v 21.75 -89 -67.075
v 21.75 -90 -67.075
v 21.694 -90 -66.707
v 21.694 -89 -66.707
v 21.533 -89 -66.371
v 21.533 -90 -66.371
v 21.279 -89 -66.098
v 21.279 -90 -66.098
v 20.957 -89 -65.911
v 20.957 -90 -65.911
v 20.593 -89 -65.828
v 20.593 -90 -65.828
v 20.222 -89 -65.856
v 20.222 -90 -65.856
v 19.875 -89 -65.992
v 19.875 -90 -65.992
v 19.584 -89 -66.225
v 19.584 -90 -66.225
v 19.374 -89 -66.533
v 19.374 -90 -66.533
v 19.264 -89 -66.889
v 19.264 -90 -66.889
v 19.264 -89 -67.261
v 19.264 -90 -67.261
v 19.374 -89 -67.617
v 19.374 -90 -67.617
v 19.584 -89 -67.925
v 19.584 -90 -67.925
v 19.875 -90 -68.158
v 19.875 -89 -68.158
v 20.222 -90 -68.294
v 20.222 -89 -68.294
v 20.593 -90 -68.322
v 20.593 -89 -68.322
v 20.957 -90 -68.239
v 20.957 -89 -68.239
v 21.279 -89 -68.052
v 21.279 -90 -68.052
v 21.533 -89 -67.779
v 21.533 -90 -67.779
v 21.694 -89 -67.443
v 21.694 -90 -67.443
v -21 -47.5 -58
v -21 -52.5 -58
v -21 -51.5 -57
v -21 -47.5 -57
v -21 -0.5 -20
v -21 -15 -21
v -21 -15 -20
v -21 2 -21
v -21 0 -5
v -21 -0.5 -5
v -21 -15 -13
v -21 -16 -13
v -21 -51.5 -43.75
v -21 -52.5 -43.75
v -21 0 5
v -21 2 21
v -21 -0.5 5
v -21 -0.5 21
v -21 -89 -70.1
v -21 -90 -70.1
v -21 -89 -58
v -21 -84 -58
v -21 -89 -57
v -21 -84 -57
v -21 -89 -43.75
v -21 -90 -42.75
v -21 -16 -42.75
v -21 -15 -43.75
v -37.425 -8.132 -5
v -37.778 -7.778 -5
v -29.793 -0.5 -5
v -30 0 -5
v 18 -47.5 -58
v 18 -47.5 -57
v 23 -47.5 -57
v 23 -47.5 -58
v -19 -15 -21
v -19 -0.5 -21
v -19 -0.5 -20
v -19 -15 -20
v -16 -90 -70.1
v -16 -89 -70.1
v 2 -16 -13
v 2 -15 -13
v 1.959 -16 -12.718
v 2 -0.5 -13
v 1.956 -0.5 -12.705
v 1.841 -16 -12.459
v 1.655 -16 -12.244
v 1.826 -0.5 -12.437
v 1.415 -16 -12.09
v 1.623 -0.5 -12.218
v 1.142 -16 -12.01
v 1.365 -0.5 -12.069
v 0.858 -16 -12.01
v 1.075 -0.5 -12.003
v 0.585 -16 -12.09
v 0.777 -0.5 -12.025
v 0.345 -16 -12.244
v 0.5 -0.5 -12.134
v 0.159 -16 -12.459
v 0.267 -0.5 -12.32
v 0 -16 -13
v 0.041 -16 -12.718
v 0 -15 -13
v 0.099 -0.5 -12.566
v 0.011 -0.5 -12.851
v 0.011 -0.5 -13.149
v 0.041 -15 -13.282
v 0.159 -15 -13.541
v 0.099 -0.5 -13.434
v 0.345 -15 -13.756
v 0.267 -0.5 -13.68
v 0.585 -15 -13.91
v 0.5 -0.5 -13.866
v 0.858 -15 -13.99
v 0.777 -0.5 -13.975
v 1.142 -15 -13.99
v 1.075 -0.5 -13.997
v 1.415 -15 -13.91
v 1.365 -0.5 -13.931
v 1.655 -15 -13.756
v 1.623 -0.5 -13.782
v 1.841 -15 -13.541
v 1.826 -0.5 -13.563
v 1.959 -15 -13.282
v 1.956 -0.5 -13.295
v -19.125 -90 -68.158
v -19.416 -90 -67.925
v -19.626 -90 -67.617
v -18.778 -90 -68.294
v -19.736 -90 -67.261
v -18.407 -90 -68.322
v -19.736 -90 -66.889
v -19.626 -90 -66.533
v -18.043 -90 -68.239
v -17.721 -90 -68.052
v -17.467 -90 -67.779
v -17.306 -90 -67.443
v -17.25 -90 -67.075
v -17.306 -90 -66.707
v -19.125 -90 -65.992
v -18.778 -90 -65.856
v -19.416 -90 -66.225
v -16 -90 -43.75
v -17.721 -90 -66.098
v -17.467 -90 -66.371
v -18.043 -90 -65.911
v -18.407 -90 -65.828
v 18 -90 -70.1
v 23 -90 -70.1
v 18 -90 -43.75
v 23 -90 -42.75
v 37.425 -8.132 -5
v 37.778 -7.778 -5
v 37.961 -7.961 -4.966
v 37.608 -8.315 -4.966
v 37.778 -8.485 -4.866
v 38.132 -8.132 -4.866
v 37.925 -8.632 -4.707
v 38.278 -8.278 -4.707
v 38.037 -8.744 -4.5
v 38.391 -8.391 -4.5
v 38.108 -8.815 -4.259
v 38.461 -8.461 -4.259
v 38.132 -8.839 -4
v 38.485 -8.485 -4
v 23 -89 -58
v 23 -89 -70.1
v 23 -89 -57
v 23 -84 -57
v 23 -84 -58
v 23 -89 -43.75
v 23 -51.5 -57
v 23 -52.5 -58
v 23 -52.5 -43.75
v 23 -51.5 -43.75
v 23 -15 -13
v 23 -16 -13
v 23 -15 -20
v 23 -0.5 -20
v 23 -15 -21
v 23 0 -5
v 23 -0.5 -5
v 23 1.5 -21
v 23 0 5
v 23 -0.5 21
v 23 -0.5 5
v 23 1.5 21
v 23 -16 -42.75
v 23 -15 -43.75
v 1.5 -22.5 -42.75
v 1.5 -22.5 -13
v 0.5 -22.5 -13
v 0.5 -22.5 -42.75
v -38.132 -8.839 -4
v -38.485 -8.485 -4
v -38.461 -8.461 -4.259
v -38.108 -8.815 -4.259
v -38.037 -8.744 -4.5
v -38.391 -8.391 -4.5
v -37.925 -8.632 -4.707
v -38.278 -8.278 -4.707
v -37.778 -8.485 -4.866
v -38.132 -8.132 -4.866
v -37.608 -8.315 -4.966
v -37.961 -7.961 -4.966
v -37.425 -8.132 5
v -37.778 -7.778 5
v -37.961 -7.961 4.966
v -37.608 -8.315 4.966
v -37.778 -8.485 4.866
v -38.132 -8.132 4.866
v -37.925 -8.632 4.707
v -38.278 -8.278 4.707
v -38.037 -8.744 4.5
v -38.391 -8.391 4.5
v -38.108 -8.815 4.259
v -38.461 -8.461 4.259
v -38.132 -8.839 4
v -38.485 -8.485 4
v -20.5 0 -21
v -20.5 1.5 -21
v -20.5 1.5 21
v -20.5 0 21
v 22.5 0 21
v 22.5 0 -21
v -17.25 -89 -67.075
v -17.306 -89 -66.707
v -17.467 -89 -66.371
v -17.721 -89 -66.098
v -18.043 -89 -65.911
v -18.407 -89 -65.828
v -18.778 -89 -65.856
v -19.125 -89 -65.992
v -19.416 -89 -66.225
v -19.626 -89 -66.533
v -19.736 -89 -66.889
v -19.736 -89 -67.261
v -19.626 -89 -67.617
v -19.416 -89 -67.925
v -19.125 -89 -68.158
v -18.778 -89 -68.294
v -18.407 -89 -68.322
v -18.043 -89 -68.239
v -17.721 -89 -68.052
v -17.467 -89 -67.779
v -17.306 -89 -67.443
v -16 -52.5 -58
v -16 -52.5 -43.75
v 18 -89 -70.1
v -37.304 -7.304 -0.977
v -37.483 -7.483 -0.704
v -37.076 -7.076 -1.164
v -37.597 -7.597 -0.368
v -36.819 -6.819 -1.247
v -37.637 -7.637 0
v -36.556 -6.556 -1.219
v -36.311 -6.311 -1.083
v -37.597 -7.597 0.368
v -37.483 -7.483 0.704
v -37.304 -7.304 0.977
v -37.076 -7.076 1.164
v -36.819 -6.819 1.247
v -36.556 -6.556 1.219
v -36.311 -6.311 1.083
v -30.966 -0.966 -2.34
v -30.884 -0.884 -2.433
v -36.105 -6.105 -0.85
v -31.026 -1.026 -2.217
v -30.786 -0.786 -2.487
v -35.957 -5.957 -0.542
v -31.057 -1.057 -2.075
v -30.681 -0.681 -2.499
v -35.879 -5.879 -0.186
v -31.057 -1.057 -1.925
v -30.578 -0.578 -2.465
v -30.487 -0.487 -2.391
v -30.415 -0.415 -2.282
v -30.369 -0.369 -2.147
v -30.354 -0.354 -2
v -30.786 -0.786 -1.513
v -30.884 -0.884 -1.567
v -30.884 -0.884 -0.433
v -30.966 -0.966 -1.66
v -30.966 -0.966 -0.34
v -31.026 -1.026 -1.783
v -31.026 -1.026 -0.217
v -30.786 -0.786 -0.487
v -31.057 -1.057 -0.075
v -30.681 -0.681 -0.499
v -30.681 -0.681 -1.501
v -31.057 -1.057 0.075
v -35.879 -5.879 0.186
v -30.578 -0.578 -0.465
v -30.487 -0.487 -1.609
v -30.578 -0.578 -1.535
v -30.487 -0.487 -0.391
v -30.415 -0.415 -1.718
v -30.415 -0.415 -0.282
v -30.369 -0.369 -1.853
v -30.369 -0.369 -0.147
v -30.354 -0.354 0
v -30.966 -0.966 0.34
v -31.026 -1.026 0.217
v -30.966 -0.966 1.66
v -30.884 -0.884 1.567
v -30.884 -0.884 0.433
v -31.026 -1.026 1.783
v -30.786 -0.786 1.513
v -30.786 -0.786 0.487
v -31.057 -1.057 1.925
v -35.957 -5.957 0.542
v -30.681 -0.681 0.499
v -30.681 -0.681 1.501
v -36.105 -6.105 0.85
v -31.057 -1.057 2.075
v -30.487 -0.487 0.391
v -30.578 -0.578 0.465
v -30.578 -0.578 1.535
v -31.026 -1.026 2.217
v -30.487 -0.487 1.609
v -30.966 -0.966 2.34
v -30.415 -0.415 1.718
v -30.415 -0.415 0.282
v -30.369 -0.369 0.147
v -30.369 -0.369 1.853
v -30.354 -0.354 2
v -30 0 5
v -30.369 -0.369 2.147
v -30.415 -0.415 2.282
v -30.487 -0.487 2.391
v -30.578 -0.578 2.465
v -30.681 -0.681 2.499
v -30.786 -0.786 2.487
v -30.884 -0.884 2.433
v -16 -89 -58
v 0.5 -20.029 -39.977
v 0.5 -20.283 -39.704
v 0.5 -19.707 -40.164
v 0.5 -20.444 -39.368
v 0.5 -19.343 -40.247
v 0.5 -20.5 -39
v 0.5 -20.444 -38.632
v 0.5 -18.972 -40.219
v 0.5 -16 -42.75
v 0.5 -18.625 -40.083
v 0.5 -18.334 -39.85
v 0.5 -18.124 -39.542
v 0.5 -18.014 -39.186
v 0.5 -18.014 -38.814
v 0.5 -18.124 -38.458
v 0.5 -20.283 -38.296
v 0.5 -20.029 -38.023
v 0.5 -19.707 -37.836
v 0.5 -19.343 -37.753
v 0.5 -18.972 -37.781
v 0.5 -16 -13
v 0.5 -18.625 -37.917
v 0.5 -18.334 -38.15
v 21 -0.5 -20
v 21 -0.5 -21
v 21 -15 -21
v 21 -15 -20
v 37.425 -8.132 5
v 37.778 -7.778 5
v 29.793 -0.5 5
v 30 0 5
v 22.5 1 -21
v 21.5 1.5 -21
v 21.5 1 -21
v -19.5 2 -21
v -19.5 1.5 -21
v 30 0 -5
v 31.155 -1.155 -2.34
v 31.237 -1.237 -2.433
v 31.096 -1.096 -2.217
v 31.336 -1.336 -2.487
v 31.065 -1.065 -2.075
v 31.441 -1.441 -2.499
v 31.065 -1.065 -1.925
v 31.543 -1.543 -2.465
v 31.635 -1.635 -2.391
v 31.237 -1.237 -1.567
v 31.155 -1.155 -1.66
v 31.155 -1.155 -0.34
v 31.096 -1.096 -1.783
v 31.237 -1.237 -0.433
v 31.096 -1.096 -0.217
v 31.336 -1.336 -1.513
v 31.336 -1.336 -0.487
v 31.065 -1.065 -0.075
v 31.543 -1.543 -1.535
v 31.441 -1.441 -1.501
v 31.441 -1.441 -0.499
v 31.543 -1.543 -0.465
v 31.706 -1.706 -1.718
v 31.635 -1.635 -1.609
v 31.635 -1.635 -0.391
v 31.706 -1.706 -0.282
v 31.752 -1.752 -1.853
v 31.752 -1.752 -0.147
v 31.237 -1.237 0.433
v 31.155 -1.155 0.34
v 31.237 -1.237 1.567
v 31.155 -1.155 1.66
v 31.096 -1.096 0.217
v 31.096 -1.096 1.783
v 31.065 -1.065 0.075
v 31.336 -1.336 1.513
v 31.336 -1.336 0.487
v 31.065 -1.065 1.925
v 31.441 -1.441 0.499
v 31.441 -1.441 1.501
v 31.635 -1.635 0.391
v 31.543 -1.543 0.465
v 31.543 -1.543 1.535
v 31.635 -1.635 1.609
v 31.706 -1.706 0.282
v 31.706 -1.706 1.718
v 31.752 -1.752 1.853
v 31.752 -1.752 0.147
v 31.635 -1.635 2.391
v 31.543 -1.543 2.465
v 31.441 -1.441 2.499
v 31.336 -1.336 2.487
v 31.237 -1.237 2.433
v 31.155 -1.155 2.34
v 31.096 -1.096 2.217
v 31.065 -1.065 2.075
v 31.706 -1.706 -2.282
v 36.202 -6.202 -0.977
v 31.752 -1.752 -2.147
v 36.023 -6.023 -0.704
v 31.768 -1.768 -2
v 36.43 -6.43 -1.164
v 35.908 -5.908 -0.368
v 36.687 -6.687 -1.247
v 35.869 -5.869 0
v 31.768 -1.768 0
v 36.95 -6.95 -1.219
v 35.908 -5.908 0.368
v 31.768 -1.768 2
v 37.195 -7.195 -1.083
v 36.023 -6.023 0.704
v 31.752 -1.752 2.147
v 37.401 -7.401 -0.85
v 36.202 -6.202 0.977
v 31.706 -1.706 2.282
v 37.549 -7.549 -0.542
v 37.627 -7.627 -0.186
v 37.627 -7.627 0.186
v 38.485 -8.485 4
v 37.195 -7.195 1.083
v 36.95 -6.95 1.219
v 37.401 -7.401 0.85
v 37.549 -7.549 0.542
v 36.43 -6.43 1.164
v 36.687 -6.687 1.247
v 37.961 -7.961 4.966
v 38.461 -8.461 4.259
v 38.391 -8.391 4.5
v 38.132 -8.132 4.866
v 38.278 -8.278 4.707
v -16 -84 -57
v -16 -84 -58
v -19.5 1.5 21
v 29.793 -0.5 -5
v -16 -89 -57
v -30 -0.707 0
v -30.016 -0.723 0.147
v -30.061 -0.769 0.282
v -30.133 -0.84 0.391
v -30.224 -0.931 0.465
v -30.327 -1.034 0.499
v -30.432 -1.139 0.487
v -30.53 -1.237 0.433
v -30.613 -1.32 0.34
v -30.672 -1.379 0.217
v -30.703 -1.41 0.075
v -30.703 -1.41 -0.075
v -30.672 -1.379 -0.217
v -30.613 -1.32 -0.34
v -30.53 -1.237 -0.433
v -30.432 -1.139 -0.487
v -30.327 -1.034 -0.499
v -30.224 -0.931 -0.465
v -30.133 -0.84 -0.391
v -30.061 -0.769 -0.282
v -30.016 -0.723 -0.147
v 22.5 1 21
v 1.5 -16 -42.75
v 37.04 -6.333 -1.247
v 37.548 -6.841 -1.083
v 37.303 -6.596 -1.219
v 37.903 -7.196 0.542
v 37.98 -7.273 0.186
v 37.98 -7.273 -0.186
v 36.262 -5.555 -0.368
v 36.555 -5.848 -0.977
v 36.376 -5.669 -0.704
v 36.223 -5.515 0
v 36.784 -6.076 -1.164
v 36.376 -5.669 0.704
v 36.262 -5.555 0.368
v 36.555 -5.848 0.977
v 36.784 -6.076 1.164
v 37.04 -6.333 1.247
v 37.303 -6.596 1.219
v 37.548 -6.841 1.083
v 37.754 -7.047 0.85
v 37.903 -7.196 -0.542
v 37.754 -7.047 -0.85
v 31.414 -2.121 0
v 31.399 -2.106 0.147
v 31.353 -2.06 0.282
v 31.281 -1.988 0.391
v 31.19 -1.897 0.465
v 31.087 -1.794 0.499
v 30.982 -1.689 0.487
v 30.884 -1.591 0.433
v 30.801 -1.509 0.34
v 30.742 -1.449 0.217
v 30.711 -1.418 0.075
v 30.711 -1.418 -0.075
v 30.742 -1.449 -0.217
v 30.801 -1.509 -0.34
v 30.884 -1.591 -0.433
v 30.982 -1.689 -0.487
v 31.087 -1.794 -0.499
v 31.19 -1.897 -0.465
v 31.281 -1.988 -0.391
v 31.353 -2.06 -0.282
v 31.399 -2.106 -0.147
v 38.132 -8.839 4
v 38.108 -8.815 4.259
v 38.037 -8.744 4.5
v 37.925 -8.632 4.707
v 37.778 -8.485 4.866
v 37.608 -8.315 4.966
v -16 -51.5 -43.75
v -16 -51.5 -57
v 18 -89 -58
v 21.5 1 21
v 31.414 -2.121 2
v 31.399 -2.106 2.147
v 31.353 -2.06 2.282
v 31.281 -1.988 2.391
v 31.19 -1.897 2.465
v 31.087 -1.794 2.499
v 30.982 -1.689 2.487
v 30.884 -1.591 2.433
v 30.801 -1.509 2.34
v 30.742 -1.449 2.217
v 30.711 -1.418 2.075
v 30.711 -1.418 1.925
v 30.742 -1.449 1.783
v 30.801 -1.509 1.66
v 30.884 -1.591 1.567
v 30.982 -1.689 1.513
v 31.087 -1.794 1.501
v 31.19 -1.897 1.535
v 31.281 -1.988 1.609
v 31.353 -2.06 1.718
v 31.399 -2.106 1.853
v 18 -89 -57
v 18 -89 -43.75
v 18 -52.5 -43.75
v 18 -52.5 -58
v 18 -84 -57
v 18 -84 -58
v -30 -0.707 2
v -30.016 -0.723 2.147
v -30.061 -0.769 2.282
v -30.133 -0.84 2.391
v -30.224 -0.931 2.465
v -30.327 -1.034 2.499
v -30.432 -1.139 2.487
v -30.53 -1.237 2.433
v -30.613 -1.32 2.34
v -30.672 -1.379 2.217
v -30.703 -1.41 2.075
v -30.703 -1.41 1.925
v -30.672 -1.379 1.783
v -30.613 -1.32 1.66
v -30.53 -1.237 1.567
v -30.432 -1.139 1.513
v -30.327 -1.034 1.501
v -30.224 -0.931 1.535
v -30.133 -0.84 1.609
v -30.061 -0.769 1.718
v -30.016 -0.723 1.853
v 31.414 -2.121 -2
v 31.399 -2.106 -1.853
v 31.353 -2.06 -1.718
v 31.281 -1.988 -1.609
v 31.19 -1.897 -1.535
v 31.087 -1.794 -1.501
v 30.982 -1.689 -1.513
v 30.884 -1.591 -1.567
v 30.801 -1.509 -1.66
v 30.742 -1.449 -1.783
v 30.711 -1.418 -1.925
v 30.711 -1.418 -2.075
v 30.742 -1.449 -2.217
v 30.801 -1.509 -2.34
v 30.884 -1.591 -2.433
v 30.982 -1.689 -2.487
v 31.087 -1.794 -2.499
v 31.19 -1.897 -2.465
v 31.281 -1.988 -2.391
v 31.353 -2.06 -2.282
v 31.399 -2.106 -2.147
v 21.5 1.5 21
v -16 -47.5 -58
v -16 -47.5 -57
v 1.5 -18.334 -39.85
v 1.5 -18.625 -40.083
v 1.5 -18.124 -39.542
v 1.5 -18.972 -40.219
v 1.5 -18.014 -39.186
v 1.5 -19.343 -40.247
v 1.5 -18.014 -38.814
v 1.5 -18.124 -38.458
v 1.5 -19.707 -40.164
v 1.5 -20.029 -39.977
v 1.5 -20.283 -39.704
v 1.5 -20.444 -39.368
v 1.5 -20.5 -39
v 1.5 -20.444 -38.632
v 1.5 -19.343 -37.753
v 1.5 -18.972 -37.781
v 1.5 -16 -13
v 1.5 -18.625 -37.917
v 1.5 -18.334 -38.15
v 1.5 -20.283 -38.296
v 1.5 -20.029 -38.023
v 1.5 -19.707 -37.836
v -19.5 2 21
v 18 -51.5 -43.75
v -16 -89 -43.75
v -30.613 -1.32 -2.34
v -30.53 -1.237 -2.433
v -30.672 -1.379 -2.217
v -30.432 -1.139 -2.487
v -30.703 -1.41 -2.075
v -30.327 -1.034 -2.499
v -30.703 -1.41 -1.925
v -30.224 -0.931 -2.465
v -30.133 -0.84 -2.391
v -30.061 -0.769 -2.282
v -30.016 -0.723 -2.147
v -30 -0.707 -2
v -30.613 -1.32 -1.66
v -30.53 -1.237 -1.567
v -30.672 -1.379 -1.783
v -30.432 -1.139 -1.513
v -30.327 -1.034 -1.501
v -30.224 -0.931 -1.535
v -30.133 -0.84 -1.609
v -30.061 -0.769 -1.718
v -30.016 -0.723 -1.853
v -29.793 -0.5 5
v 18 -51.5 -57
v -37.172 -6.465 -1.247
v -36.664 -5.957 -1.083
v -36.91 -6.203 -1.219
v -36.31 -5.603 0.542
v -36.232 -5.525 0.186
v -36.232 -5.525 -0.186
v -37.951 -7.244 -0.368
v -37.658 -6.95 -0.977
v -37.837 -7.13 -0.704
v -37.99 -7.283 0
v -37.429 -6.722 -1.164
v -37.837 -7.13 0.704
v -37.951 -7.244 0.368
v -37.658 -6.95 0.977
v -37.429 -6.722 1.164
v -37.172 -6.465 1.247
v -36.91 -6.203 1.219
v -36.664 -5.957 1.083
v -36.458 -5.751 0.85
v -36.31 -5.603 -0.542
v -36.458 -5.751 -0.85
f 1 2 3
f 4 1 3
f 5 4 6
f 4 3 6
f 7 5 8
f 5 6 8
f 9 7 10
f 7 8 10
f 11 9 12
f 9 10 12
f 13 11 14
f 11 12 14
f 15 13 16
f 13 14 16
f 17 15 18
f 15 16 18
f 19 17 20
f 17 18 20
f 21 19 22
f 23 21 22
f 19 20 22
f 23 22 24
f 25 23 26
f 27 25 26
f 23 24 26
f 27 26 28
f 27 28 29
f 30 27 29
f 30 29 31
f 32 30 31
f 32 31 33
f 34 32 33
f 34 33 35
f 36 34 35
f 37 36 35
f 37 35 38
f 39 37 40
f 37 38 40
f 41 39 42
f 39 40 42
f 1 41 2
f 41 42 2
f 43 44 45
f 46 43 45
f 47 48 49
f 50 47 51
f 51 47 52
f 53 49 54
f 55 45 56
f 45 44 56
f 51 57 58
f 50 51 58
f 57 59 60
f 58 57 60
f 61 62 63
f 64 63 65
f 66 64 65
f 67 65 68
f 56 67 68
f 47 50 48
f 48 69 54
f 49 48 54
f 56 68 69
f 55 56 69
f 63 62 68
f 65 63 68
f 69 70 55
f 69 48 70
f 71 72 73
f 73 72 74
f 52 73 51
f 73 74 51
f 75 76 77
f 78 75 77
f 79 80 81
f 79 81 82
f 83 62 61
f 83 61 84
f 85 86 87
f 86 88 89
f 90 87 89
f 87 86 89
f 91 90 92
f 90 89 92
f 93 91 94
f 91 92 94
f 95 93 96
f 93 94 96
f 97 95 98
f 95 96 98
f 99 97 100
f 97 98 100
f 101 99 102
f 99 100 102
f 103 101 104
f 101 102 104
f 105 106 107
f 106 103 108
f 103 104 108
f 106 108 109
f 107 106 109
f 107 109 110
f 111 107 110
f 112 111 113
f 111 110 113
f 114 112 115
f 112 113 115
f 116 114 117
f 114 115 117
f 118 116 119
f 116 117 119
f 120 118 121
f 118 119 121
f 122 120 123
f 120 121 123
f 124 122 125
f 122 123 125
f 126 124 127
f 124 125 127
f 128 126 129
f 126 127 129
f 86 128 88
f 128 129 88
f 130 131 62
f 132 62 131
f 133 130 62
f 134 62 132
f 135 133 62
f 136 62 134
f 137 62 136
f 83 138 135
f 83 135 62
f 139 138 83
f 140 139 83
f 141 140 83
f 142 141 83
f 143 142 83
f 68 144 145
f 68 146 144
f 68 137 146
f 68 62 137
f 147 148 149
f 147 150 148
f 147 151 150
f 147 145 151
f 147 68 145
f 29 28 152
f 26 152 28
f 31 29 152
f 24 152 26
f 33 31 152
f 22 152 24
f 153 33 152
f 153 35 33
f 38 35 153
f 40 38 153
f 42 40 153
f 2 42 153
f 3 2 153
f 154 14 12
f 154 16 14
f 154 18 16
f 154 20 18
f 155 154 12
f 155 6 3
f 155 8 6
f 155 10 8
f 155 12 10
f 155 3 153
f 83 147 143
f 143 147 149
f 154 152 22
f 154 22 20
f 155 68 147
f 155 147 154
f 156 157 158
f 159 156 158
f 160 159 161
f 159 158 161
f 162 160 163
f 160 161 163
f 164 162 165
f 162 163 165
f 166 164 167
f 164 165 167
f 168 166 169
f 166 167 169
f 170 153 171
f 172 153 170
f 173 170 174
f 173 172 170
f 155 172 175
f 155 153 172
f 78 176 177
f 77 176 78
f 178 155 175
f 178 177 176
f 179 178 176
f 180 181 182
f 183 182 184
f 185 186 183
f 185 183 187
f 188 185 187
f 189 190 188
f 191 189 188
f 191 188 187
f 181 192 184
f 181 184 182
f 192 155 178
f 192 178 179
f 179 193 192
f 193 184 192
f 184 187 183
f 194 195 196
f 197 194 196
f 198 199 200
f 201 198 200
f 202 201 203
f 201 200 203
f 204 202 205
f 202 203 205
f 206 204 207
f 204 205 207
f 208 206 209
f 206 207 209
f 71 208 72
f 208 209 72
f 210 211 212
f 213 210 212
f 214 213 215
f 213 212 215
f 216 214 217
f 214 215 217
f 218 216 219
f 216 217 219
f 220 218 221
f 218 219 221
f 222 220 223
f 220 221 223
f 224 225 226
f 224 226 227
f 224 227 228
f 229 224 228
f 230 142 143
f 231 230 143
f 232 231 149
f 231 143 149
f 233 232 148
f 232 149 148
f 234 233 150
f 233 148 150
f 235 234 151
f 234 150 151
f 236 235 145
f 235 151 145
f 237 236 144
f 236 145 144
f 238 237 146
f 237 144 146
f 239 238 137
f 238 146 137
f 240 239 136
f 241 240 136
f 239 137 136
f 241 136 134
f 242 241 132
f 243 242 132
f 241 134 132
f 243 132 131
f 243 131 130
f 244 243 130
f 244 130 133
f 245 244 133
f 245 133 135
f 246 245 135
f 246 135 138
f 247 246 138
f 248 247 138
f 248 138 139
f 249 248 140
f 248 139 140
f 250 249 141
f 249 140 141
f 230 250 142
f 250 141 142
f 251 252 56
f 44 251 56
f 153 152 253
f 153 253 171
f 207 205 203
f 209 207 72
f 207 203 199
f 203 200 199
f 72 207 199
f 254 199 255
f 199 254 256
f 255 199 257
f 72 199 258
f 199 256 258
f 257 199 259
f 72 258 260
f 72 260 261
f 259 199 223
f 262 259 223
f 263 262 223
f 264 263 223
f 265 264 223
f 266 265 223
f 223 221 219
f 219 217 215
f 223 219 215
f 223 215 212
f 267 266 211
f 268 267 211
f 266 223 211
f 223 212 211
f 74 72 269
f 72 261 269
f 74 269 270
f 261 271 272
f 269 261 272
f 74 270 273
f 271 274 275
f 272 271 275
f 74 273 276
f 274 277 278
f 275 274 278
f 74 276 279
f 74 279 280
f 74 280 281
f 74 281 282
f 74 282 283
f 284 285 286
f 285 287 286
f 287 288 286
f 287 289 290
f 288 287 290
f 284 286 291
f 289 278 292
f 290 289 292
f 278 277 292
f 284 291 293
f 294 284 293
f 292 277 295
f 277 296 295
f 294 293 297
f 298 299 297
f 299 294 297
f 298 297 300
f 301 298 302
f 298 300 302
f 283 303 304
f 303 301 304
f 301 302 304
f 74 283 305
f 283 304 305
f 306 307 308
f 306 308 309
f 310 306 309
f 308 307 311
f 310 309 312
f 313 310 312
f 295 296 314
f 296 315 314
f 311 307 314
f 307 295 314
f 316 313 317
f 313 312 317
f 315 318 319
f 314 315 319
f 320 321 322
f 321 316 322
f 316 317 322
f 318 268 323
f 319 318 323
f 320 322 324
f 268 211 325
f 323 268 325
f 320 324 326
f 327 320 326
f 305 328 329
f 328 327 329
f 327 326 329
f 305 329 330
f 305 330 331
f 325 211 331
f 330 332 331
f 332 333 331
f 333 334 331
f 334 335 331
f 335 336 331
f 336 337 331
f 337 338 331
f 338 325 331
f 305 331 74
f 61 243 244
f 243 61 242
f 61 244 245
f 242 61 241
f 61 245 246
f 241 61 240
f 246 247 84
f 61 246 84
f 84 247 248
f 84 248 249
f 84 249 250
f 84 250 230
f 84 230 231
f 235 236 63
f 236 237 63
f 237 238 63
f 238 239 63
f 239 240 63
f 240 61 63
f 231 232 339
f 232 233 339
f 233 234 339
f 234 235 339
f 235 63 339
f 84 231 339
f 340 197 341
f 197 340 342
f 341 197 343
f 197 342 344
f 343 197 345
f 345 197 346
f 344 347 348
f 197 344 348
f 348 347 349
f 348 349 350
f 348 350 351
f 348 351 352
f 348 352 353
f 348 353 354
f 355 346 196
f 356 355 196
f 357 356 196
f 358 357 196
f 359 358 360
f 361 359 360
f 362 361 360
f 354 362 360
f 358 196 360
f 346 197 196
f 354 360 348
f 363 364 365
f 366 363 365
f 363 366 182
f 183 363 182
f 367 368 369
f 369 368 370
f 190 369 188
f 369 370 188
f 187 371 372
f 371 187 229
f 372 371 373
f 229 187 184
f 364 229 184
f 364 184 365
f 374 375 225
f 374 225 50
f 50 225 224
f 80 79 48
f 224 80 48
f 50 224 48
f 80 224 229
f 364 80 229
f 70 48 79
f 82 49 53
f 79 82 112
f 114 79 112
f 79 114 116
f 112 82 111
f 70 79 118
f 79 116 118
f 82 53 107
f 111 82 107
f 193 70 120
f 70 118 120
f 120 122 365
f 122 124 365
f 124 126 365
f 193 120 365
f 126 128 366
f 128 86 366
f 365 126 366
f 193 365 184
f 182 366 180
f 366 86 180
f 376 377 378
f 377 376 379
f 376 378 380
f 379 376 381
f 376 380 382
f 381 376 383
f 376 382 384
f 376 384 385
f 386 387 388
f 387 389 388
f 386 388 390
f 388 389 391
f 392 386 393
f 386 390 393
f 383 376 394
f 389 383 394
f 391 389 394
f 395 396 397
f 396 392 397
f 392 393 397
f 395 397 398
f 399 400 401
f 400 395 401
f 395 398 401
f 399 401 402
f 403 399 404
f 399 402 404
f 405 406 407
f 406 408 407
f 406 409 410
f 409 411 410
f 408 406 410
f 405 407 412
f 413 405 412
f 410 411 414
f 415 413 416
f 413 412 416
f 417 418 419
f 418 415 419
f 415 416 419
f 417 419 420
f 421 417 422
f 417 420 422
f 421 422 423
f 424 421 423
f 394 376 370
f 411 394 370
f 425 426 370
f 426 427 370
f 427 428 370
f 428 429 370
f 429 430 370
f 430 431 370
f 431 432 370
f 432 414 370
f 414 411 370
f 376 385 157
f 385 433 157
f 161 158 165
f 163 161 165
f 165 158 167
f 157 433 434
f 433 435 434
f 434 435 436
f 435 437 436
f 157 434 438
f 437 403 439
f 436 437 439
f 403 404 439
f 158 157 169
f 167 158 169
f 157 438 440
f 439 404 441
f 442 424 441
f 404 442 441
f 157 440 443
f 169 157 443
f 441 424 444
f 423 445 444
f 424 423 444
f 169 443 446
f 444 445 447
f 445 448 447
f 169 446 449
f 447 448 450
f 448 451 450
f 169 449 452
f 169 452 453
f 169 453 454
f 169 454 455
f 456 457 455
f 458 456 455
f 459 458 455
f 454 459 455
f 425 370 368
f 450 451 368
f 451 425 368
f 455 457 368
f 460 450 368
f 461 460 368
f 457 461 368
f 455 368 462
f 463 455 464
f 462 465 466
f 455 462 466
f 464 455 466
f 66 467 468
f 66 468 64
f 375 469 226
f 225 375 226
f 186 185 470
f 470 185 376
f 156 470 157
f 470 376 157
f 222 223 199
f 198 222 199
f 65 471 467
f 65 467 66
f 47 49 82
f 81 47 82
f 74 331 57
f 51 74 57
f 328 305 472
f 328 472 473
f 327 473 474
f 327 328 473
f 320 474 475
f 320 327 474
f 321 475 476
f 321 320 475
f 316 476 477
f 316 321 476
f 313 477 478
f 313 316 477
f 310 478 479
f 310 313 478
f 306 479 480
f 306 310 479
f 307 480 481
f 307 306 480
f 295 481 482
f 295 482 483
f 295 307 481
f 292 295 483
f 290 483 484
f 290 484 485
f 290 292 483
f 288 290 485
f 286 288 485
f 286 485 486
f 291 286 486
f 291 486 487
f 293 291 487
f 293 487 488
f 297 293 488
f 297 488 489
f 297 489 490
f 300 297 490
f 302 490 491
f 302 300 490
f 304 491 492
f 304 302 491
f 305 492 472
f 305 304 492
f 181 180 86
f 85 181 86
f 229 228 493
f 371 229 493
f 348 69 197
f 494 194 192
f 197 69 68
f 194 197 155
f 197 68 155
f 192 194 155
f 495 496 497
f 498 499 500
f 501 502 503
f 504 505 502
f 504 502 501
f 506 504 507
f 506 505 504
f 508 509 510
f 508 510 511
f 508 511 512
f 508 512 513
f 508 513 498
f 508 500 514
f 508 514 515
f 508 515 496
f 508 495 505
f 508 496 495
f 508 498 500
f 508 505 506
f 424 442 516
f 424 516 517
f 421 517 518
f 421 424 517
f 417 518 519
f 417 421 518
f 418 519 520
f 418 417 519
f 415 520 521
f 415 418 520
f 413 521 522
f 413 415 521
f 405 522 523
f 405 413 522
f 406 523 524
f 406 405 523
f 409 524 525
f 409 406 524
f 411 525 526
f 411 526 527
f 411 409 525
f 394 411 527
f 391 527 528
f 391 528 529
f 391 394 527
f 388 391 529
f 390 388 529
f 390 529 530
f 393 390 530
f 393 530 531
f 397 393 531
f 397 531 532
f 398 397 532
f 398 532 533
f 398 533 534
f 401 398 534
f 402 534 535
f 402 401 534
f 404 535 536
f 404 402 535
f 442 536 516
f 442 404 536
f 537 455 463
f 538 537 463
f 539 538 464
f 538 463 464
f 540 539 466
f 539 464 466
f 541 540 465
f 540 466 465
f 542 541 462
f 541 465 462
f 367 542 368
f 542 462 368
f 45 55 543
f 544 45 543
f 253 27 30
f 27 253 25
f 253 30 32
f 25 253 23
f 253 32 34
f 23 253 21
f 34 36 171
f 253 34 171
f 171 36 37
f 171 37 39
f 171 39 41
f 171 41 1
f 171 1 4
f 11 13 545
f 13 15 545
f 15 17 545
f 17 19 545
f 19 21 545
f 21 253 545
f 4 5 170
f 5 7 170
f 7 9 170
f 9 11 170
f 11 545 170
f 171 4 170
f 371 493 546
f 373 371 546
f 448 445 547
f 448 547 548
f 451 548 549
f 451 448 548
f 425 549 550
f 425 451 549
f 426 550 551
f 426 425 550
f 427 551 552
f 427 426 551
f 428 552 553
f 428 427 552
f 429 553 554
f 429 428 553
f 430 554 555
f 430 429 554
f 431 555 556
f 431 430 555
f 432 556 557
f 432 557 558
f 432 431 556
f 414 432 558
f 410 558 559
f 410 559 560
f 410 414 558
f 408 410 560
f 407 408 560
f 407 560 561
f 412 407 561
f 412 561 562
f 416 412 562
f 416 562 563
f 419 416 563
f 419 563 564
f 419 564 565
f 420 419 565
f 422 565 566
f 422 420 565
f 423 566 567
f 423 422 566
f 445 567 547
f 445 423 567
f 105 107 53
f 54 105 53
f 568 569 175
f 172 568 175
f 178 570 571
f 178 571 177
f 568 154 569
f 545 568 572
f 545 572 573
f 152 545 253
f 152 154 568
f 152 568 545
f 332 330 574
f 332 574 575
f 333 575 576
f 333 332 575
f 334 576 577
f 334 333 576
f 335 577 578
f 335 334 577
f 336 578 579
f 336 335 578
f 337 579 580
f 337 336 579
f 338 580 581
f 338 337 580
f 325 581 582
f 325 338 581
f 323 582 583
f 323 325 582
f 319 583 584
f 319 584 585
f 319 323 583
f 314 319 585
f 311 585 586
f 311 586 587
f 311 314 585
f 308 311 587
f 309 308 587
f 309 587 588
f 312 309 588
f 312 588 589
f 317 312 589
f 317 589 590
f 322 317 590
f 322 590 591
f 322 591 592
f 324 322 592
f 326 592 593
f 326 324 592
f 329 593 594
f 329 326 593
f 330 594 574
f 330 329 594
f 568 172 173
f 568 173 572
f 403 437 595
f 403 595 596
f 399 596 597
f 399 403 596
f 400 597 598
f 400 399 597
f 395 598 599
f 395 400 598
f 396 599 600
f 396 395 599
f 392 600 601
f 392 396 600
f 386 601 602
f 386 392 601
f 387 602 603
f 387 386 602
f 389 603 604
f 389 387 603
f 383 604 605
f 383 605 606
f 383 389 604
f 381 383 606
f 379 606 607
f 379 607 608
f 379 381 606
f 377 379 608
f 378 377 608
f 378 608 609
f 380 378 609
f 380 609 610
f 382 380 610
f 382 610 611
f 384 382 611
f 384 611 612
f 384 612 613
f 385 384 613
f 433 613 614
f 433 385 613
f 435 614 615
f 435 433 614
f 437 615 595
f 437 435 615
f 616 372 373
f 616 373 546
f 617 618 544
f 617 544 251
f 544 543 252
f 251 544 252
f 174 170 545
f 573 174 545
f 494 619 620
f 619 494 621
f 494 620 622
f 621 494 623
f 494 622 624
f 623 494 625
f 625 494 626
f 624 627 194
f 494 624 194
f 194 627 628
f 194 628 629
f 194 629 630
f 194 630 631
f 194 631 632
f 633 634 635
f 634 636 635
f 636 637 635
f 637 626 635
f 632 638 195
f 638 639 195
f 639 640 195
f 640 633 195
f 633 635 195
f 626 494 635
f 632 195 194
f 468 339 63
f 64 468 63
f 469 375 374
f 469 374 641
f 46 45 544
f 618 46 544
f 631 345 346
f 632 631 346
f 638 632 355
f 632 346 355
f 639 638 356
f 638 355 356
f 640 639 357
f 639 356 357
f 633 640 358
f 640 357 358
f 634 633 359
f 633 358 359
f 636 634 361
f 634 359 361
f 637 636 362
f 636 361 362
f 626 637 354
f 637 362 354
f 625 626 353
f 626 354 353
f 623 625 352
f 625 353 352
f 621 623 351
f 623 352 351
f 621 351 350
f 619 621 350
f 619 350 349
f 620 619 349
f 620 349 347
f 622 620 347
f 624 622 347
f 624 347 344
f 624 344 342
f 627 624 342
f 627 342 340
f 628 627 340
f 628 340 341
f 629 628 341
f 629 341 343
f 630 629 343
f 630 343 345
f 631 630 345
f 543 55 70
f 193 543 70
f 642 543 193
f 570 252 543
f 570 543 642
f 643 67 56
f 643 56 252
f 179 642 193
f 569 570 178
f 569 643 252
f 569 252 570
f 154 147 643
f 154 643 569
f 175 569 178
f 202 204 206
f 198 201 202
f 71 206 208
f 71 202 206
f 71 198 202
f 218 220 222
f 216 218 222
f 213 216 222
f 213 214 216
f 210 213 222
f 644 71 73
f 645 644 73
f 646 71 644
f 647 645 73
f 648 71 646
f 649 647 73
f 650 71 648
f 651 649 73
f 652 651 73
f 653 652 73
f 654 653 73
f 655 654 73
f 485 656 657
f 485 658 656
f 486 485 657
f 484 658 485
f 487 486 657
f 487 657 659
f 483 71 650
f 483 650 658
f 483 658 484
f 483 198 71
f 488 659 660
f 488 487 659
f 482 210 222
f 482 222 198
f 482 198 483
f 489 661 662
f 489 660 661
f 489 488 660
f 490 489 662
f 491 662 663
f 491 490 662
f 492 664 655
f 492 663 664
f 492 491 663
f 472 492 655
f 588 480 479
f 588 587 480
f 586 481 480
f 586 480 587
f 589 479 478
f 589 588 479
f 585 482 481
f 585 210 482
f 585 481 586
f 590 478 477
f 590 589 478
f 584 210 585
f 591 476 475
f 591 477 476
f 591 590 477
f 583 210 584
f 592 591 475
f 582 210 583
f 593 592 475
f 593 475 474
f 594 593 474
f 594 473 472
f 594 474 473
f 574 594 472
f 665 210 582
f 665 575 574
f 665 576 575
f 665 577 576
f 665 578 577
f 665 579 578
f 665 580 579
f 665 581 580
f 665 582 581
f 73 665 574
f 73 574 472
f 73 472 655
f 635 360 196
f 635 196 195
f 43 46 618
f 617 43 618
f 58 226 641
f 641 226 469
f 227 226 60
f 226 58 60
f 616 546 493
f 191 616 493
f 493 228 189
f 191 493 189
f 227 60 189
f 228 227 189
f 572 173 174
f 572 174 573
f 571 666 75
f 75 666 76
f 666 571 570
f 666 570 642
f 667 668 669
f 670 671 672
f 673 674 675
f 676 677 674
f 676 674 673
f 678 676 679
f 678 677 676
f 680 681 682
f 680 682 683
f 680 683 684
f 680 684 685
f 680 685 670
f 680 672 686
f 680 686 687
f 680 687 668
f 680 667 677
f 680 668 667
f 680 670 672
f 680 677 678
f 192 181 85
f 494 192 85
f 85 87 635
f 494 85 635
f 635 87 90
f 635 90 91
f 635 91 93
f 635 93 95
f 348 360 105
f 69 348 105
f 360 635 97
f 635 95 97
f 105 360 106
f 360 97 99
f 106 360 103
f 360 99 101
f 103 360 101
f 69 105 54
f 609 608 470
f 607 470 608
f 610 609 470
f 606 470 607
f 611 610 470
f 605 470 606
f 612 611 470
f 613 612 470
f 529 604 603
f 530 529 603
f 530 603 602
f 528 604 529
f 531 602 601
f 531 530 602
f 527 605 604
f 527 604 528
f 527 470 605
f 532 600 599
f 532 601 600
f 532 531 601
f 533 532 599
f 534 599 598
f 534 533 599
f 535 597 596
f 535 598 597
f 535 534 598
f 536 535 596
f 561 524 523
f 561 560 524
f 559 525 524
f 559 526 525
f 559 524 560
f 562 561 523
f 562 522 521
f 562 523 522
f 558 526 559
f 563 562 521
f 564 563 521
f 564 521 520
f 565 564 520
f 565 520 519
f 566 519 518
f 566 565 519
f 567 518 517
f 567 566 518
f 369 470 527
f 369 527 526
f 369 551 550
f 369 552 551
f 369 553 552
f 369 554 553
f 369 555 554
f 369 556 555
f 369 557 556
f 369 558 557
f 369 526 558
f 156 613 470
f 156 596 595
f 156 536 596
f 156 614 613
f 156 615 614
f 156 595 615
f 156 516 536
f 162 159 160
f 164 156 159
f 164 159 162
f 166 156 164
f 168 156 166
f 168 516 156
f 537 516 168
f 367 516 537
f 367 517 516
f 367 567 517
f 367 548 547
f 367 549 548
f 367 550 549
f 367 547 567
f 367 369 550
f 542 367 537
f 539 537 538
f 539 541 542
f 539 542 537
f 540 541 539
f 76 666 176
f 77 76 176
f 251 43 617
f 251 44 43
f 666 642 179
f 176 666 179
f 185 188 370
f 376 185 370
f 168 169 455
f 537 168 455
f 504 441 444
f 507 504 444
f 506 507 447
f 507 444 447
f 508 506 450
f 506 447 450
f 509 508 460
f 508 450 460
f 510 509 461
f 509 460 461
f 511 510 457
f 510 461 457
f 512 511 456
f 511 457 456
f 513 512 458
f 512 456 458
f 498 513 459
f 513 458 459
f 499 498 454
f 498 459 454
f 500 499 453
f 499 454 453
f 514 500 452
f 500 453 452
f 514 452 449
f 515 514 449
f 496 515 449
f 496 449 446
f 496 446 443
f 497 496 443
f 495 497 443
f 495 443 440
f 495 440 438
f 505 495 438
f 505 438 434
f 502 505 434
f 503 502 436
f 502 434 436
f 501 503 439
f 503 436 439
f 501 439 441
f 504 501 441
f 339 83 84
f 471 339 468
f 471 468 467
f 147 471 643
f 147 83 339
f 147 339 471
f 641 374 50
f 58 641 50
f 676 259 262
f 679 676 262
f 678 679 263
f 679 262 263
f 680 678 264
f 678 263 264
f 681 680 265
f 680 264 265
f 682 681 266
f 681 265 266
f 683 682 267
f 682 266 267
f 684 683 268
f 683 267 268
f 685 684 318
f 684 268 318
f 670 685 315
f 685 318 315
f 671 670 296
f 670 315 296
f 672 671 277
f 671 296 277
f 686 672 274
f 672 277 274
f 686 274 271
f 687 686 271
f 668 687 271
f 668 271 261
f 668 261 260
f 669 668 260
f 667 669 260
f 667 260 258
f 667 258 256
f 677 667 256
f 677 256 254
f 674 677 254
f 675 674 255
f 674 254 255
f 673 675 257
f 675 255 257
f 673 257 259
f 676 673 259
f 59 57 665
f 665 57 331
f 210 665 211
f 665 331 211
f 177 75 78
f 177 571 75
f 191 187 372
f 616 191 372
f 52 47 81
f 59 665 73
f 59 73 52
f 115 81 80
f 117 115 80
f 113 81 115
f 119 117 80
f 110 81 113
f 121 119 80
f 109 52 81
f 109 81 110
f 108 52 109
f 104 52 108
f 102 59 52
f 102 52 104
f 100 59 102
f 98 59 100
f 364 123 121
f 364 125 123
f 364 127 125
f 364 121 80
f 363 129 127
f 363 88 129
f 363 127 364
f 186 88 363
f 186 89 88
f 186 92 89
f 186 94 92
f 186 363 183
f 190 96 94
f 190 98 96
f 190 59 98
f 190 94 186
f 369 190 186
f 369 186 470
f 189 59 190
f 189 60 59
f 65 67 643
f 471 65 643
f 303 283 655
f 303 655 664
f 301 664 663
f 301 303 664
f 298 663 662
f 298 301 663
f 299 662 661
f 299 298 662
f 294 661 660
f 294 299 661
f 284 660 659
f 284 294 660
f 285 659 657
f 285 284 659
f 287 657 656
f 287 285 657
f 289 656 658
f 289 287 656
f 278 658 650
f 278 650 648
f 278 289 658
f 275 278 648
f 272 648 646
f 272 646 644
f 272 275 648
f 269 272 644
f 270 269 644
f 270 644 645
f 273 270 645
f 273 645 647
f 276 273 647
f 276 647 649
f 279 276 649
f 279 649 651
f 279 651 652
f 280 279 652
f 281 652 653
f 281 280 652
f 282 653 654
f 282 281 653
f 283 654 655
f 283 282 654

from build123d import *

# Parameters (mm, degrees)
F0_W      = 9
F0_H      = 10
F0_W_2    = 44
F0_H_2    = 16
F0_W_3    = 7
F0_R      = 1
F1_DEPTH  = 0.5
F3_R      = 0.5
F3_W      = 0.3535533906
F3_H      = 10
F4_DEPTH  = 0.5
F6_R      = 0.5
F6_W      = 0.3535533906
F6_H      = 10
F7_DEPTH  = 0.5
F8_R      = 1.25
F9_DEPTH  = 0.5
F10_R     = 1.25
F11_DEPTH = 0.5
F12_DEPTH = 0.5
F14_DEPTH = 15
F13_W     = 2
F13_H     = 14.5
F15_DEPTH = 1
F16_W     = 2
F16_H     = 1
F17_DEPTH = 1
F18_W     = 1
F18_H     = 29.75
F19_DEPTH = 6.5
F21_D     = 2.5
F21_DEPTH = 8
F21_TIP   = 0.7510757738
F23_DEPTH = 1
F25_DEPTH = 1
F26_R     = 1.25
F27_DEPTH = 1
F28_W     = 5
F28_H     = 1
F29_DEPTH = 5
F30_DEPTH = 14.25
F31_W     = 5
F31_H     = 4
F31_H_2   = 1
F32_DEPTH = 1
F34_DEPTH = 0.5
F35_W     = 1
F35_H     = 42
F36_DEPTH = 0.5
F38_DEPTH = 0.5
F39_W     = 0.5
F39_H     = 42
F39_W_2   = 1
F40_DEPTH = 0.5


# Not quite as in the source:
# - a feature of the source that left no trace in its solid (it failed there, or was rolled back) is left out
# - a feature names something its author has since deleted; it is built from what else it names


with BuildPart() as f1:
    # F0 (on Front) → F1 (new body)
    with BuildSketch(Plane.XZ):
        with Locations((-25.5, 0)):
            Rectangle(F0_W, F0_H)
        with Locations((1, 13)):
            Rectangle(F0_W_2, F0_H_2)
        with Locations((1, 0)):
            Rectangle(F0_W_2, F0_H)
        with Locations((26.5, 0)):
            Rectangle(F0_W_3, F0_H)
        with Locations((1, -13)):
            Rectangle(F0_W_2, F0_H_2)
        with Locations((1, -13)):
            Circle(F0_R, mode=Mode.SUBTRACT)
    extrude(amount=F1_DEPTH)

    # F3 (on face) → F4 (join)
    with BuildSketch(Plane(origin=(15, 15, 0), x_dir=(0.7071067812, -0.7071067812, 0), z_dir=(-0.7071067812, -0.7071067812, 0))):
        with BuildLine():
            Line((21.5667568262, 5), (21.5667568262, -5))
            Line((21.5667568262, -5), (32.2132034356, -5))
            ThreePointArc((32.2132034356, -5), (32.9203102168, -4.7071067812), (33.2132034356, -4))
            Line((33.2132034356, -4), (33.2132034356, 4))
            ThreePointArc((33.2132034356, 4), (32.9203102168, 4.7071067812), (32.2132034356, 5))
            Line((32.2132034356, 5), (21.5667568262, 5))
        make_face()
        with Locations((23.2132034356, -2)):
            Circle(F3_R, mode=Mode.SUBTRACT)
        with Locations((23.2132034356, 0)):
            Circle(F3_R, mode=Mode.SUBTRACT)
        with Locations((23.2132034356, 2)):
            Circle(F3_R, mode=Mode.SUBTRACT)
        with Locations((21.3899801309, 0)):
            Rectangle(F3_W, F3_H)
    extrude(amount=F4_DEPTH)

    # F6 (on face) → F7 (join)
    with BuildSketch(Plane(origin=(-15, 15, 0), x_dir=(0.7071067812, 0.7071067812, 0), z_dir=(0.7071067812, -0.7071067812, 0))):
        with BuildLine():
            Line((-21.5667568262, -5), (-21.5667568262, 5))
            Line((-21.5667568262, 5), (-32.2132034356, 5))
            ThreePointArc((-32.2132034356, 5), (-32.9203102168, 4.7071067812), (-33.2132034356, 4))
            Line((-33.2132034356, 4), (-33.2132034356, -4))
            ThreePointArc((-33.2132034356, -4), (-32.9203102168, -4.7071067812), (-32.2132034356, -5))
            Line((-32.2132034356, -5), (-21.5667568262, -5))
        make_face()
        with Locations((-22.2132034356, -2)):
            Circle(F6_R, mode=Mode.SUBTRACT)
        with Locations((-22.2132034356, 0)):
            Circle(F6_R, mode=Mode.SUBTRACT)
        with Locations((-22.2132034356, 2)):
            Circle(F6_R, mode=Mode.SUBTRACT)
        with Locations((-21.3899801309, 0)):
            Rectangle(F6_W, F6_H)
    extrude(amount=F7_DEPTH)

    # F8 (on face) → F9 (join)
    with BuildSketch(Plane(origin=(15, 15, 0), x_dir=(-0.7071067812, 0.7071067812, 0), z_dir=(0.7071067812, 0.7071067812, 0))):
        with Locations((-30.7632034356, 0)):
            Circle(F8_R)
    extrude(amount=F9_DEPTH)

    # F10 (on face) → F11 (join)
    with BuildSketch(Plane(origin=(-15, 15, 0), x_dir=(-0.7071067812, -0.7071067812, 0), z_dir=(-0.7071067812, 0.7071067812, 0))):
        with Locations((30.7632034356, 0)):
            Circle(F10_R)
    extrude(amount=F11_DEPTH)

    # F0 (on Front) → F12 (join)
    with BuildSketch(Plane.XZ):
        with Locations((1, 13)):
            Rectangle(F0_W_2, F0_H_2)
        with Locations((1, -13)):
            Rectangle(F0_W_2, F0_H_2)
        with Locations((1, -13)):
            Circle(F0_R, mode=Mode.SUBTRACT)
    extrude(amount=F12_DEPTH)

    # F0 (on Front) → F14 (join)
    with BuildSketch(Plane.XZ):
        with Locations((1, -13)):
            Circle(F0_R)
    extrude(amount=F14_DEPTH)

    # F13 (on face) → F15 (join)
    with BuildSketch(Plane(origin=(0, 0, -21), x_dir=(1, 0, 0), z_dir=(0, 0, -1))):
        with Locations((-20, 7.75)):
            Rectangle(F13_W, F13_H)
        with Locations((22, 7.75)):
            Rectangle(F13_W, F13_H)
    extrude(amount=-F15_DEPTH)

    # F16 (on face) → F17 (join)
    with BuildSketch(Plane.XZ.offset(15)):
        with BuildLine():
            Line((-19, -21), (-21, -21))
            Line((-21, -21), (-21, -42.75))
            Line((-21, -42.75), (23, -42.75))
            Line((23, -42.75), (23, -21))
            Line((23, -21), (21, -21))
            Line((21, -21), (21, -20))
            Line((21, -20), (23, -20))
            Line((23, -20), (23, -13))
            Line((23, -13), (2, -13))
            ThreePointArc((2, -13), (1, -14), (0, -13))
            Line((0, -13), (-21, -13))
            Line((-21, -13), (-21, -20))
            Line((-21, -20), (-19, -20))
            Line((-19, -20), (-19, -21))
        make_face()
        with Locations((-20, -20.5)):
            Rectangle(F16_W, F16_H)
        with BuildLine():
            ThreePointArc((2, -13), (1, -12), (0, -13))
            Line((0, -13), (2, -13))
        make_face()
        with BuildLine():
            Line((2, -13), (0, -13))
            ThreePointArc((0, -13), (1, -14), (2, -13))
        make_face()
        with Locations((22, -20.5)):
            Rectangle(F16_W, F16_H)
    extrude(amount=F17_DEPTH)

    # F18 (on face) → F19 (join)
    with BuildSketch(Plane.XZ.offset(16)):
        with Locations((1, -27.875)):
            Rectangle(F18_W, F18_H)
    extrude(amount=F19_DEPTH)

    # F21
    with Locations(Plane.YZ.offset(1.5)):
        with Locations((-19.25, -39)):
            Hole(F21_D / 2, depth=F21_DEPTH)
            with Locations((0, 0, -(F21_DEPTH + F21_TIP / 2))):  # 118° drill point
                Cone(0, F21_D / 2, F21_TIP, mode=Mode.SUBTRACT)

    # F22 (on face) → F23 (join)
    with BuildSketch(Plane(origin=(0, 0, -42.75), x_dir=(1, 0, 0), z_dir=(0, 0, -1))):
        Polygon((-21, 15), (23, 15), (23, 16), (1.5, 16), (1.5, 22.5), (0.5, 22.5), (0.5, 16), (-21, 16), align=None)
    extrude(amount=F23_DEPTH)

    # F22 (on face) → F25 (join)
    with BuildSketch(Plane(origin=(0, 0, -42.75), x_dir=(1, 0, 0), z_dir=(0, 0, -1))):
        Polygon((1.5, 16), (23, 16), (23, 51.5), (18, 51.5), (18, 52.5), (23, 52.5), (23, 53), (23, 90), (-21, 90), (-21, 52.5), (-16, 52.5), (-16, 51.5), (-21, 51.5), (-21, 16), (0.5, 16), (0.5, 22.5), (1.5, 22.5), align=None)
        Polygon((-21, 15), (23, 15), (23, 16), (1.5, 16), (1.5, 22.5), (0.5, 22.5), (0.5, 16), (-21, 16), align=None)
    extrude(amount=F25_DEPTH)

    # F26 (on face) → F27 (join)
    with BuildSketch(Plane.XZ.offset(90)):
        Polygon((-16, -43.75), (-21, -43.75), (-21, -58), (-21, -70.1), (-16, -70.1), align=None)
        with Locations((-18.5, -67.075)):
            Circle(F26_R, mode=Mode.SUBTRACT)
        Polygon((23, -43.75), (18, -43.75), (18, -70.1), (23, -70.1), (23, -58), align=None)
        with Locations((20.5, -67.075)):
            Circle(F26_R, mode=Mode.SUBTRACT)
    extrude(amount=-F27_DEPTH)

    # F28 (on face) → F29 (join)
    with BuildSketch(Plane(origin=(0, -89, 0), x_dir=(-1, 0, 0), z_dir=(0, 1, 0))):
        with Locations((18.5, -57.5)):
            Rectangle(F28_W, F28_H)
        with Locations((-20.5, -57.5)):
            Rectangle(F28_W, F28_H)
    extrude(amount=F29_DEPTH)

    # F22 (on face) → F30 (join)
    with BuildSketch(Plane(origin=(0, 0, -42.75), x_dir=(1, 0, 0), z_dir=(0, 0, -1))):
        Polygon((-21, 52), (-21, 51.5), (-16, 51.5), (-16, 52.5), (-21, 52.5), align=None)
        Polygon((18, 51.5), (23, 51.5), (23, 52), (23, 52.5), (18, 52.5), align=None)
    extrude(amount=F30_DEPTH)

    # F31 (on face) → F32 (join)
    with BuildSketch(Plane(origin=(0, 0, -57), x_dir=(1, 0, 0), z_dir=(0, 0, -1))):
        with Locations((20.5, 49.5)):
            Rectangle(F31_W, F31_H)
        with Locations((20.5, 52)):
            Rectangle(F31_W, F31_H_2)
        with Locations((-18.5, 49.5)):
            Rectangle(F31_W, F31_H)
        with Locations((-18.5, 52)):
            Rectangle(F31_W, F31_H_2)
    extrude(amount=F32_DEPTH)

    # F33 (on face) → F34 (join)
    with BuildSketch(Plane.YZ.offset(23)):
        Polygon((0, 21), (0, 5), (0, -5), (0, -21), (1.5, -21), (1.5, 21), align=None)
    extrude(amount=-F34_DEPTH)

    # F35 (on face) → F36 (join)
    with BuildSketch(Plane(origin=(0, 1.5, 0), x_dir=(-1, 0, 0), z_dir=(0, 1, 0))):
        with Locations((-22, 0)):
            Rectangle(F35_W, F35_H)
    extrude(amount=-F36_DEPTH)

    # F37 (on face) → F38 (join)
    with BuildSketch(Plane(origin=(-21, 0, 0), x_dir=(0, -1, 0), z_dir=(-1, 0, 0))):
        Polygon((-1.5, -21), (0, -21), (0, -5), (0, 21), (-1.5, 21), align=None)
    extrude(amount=-F38_DEPTH)

    # F39 (on face) → F40 (join)
    with BuildSketch(Plane(origin=(0, 1.5, 0), x_dir=(-1, 0, 0), z_dir=(0, 1, 0))):
        with Locations((20.75, 0)):
            Rectangle(F39_W, F39_H)
        with Locations((20, 0)):
            Rectangle(F39_W_2, F39_H)
    extrude(amount=F40_DEPTH)


solid = f1.part
